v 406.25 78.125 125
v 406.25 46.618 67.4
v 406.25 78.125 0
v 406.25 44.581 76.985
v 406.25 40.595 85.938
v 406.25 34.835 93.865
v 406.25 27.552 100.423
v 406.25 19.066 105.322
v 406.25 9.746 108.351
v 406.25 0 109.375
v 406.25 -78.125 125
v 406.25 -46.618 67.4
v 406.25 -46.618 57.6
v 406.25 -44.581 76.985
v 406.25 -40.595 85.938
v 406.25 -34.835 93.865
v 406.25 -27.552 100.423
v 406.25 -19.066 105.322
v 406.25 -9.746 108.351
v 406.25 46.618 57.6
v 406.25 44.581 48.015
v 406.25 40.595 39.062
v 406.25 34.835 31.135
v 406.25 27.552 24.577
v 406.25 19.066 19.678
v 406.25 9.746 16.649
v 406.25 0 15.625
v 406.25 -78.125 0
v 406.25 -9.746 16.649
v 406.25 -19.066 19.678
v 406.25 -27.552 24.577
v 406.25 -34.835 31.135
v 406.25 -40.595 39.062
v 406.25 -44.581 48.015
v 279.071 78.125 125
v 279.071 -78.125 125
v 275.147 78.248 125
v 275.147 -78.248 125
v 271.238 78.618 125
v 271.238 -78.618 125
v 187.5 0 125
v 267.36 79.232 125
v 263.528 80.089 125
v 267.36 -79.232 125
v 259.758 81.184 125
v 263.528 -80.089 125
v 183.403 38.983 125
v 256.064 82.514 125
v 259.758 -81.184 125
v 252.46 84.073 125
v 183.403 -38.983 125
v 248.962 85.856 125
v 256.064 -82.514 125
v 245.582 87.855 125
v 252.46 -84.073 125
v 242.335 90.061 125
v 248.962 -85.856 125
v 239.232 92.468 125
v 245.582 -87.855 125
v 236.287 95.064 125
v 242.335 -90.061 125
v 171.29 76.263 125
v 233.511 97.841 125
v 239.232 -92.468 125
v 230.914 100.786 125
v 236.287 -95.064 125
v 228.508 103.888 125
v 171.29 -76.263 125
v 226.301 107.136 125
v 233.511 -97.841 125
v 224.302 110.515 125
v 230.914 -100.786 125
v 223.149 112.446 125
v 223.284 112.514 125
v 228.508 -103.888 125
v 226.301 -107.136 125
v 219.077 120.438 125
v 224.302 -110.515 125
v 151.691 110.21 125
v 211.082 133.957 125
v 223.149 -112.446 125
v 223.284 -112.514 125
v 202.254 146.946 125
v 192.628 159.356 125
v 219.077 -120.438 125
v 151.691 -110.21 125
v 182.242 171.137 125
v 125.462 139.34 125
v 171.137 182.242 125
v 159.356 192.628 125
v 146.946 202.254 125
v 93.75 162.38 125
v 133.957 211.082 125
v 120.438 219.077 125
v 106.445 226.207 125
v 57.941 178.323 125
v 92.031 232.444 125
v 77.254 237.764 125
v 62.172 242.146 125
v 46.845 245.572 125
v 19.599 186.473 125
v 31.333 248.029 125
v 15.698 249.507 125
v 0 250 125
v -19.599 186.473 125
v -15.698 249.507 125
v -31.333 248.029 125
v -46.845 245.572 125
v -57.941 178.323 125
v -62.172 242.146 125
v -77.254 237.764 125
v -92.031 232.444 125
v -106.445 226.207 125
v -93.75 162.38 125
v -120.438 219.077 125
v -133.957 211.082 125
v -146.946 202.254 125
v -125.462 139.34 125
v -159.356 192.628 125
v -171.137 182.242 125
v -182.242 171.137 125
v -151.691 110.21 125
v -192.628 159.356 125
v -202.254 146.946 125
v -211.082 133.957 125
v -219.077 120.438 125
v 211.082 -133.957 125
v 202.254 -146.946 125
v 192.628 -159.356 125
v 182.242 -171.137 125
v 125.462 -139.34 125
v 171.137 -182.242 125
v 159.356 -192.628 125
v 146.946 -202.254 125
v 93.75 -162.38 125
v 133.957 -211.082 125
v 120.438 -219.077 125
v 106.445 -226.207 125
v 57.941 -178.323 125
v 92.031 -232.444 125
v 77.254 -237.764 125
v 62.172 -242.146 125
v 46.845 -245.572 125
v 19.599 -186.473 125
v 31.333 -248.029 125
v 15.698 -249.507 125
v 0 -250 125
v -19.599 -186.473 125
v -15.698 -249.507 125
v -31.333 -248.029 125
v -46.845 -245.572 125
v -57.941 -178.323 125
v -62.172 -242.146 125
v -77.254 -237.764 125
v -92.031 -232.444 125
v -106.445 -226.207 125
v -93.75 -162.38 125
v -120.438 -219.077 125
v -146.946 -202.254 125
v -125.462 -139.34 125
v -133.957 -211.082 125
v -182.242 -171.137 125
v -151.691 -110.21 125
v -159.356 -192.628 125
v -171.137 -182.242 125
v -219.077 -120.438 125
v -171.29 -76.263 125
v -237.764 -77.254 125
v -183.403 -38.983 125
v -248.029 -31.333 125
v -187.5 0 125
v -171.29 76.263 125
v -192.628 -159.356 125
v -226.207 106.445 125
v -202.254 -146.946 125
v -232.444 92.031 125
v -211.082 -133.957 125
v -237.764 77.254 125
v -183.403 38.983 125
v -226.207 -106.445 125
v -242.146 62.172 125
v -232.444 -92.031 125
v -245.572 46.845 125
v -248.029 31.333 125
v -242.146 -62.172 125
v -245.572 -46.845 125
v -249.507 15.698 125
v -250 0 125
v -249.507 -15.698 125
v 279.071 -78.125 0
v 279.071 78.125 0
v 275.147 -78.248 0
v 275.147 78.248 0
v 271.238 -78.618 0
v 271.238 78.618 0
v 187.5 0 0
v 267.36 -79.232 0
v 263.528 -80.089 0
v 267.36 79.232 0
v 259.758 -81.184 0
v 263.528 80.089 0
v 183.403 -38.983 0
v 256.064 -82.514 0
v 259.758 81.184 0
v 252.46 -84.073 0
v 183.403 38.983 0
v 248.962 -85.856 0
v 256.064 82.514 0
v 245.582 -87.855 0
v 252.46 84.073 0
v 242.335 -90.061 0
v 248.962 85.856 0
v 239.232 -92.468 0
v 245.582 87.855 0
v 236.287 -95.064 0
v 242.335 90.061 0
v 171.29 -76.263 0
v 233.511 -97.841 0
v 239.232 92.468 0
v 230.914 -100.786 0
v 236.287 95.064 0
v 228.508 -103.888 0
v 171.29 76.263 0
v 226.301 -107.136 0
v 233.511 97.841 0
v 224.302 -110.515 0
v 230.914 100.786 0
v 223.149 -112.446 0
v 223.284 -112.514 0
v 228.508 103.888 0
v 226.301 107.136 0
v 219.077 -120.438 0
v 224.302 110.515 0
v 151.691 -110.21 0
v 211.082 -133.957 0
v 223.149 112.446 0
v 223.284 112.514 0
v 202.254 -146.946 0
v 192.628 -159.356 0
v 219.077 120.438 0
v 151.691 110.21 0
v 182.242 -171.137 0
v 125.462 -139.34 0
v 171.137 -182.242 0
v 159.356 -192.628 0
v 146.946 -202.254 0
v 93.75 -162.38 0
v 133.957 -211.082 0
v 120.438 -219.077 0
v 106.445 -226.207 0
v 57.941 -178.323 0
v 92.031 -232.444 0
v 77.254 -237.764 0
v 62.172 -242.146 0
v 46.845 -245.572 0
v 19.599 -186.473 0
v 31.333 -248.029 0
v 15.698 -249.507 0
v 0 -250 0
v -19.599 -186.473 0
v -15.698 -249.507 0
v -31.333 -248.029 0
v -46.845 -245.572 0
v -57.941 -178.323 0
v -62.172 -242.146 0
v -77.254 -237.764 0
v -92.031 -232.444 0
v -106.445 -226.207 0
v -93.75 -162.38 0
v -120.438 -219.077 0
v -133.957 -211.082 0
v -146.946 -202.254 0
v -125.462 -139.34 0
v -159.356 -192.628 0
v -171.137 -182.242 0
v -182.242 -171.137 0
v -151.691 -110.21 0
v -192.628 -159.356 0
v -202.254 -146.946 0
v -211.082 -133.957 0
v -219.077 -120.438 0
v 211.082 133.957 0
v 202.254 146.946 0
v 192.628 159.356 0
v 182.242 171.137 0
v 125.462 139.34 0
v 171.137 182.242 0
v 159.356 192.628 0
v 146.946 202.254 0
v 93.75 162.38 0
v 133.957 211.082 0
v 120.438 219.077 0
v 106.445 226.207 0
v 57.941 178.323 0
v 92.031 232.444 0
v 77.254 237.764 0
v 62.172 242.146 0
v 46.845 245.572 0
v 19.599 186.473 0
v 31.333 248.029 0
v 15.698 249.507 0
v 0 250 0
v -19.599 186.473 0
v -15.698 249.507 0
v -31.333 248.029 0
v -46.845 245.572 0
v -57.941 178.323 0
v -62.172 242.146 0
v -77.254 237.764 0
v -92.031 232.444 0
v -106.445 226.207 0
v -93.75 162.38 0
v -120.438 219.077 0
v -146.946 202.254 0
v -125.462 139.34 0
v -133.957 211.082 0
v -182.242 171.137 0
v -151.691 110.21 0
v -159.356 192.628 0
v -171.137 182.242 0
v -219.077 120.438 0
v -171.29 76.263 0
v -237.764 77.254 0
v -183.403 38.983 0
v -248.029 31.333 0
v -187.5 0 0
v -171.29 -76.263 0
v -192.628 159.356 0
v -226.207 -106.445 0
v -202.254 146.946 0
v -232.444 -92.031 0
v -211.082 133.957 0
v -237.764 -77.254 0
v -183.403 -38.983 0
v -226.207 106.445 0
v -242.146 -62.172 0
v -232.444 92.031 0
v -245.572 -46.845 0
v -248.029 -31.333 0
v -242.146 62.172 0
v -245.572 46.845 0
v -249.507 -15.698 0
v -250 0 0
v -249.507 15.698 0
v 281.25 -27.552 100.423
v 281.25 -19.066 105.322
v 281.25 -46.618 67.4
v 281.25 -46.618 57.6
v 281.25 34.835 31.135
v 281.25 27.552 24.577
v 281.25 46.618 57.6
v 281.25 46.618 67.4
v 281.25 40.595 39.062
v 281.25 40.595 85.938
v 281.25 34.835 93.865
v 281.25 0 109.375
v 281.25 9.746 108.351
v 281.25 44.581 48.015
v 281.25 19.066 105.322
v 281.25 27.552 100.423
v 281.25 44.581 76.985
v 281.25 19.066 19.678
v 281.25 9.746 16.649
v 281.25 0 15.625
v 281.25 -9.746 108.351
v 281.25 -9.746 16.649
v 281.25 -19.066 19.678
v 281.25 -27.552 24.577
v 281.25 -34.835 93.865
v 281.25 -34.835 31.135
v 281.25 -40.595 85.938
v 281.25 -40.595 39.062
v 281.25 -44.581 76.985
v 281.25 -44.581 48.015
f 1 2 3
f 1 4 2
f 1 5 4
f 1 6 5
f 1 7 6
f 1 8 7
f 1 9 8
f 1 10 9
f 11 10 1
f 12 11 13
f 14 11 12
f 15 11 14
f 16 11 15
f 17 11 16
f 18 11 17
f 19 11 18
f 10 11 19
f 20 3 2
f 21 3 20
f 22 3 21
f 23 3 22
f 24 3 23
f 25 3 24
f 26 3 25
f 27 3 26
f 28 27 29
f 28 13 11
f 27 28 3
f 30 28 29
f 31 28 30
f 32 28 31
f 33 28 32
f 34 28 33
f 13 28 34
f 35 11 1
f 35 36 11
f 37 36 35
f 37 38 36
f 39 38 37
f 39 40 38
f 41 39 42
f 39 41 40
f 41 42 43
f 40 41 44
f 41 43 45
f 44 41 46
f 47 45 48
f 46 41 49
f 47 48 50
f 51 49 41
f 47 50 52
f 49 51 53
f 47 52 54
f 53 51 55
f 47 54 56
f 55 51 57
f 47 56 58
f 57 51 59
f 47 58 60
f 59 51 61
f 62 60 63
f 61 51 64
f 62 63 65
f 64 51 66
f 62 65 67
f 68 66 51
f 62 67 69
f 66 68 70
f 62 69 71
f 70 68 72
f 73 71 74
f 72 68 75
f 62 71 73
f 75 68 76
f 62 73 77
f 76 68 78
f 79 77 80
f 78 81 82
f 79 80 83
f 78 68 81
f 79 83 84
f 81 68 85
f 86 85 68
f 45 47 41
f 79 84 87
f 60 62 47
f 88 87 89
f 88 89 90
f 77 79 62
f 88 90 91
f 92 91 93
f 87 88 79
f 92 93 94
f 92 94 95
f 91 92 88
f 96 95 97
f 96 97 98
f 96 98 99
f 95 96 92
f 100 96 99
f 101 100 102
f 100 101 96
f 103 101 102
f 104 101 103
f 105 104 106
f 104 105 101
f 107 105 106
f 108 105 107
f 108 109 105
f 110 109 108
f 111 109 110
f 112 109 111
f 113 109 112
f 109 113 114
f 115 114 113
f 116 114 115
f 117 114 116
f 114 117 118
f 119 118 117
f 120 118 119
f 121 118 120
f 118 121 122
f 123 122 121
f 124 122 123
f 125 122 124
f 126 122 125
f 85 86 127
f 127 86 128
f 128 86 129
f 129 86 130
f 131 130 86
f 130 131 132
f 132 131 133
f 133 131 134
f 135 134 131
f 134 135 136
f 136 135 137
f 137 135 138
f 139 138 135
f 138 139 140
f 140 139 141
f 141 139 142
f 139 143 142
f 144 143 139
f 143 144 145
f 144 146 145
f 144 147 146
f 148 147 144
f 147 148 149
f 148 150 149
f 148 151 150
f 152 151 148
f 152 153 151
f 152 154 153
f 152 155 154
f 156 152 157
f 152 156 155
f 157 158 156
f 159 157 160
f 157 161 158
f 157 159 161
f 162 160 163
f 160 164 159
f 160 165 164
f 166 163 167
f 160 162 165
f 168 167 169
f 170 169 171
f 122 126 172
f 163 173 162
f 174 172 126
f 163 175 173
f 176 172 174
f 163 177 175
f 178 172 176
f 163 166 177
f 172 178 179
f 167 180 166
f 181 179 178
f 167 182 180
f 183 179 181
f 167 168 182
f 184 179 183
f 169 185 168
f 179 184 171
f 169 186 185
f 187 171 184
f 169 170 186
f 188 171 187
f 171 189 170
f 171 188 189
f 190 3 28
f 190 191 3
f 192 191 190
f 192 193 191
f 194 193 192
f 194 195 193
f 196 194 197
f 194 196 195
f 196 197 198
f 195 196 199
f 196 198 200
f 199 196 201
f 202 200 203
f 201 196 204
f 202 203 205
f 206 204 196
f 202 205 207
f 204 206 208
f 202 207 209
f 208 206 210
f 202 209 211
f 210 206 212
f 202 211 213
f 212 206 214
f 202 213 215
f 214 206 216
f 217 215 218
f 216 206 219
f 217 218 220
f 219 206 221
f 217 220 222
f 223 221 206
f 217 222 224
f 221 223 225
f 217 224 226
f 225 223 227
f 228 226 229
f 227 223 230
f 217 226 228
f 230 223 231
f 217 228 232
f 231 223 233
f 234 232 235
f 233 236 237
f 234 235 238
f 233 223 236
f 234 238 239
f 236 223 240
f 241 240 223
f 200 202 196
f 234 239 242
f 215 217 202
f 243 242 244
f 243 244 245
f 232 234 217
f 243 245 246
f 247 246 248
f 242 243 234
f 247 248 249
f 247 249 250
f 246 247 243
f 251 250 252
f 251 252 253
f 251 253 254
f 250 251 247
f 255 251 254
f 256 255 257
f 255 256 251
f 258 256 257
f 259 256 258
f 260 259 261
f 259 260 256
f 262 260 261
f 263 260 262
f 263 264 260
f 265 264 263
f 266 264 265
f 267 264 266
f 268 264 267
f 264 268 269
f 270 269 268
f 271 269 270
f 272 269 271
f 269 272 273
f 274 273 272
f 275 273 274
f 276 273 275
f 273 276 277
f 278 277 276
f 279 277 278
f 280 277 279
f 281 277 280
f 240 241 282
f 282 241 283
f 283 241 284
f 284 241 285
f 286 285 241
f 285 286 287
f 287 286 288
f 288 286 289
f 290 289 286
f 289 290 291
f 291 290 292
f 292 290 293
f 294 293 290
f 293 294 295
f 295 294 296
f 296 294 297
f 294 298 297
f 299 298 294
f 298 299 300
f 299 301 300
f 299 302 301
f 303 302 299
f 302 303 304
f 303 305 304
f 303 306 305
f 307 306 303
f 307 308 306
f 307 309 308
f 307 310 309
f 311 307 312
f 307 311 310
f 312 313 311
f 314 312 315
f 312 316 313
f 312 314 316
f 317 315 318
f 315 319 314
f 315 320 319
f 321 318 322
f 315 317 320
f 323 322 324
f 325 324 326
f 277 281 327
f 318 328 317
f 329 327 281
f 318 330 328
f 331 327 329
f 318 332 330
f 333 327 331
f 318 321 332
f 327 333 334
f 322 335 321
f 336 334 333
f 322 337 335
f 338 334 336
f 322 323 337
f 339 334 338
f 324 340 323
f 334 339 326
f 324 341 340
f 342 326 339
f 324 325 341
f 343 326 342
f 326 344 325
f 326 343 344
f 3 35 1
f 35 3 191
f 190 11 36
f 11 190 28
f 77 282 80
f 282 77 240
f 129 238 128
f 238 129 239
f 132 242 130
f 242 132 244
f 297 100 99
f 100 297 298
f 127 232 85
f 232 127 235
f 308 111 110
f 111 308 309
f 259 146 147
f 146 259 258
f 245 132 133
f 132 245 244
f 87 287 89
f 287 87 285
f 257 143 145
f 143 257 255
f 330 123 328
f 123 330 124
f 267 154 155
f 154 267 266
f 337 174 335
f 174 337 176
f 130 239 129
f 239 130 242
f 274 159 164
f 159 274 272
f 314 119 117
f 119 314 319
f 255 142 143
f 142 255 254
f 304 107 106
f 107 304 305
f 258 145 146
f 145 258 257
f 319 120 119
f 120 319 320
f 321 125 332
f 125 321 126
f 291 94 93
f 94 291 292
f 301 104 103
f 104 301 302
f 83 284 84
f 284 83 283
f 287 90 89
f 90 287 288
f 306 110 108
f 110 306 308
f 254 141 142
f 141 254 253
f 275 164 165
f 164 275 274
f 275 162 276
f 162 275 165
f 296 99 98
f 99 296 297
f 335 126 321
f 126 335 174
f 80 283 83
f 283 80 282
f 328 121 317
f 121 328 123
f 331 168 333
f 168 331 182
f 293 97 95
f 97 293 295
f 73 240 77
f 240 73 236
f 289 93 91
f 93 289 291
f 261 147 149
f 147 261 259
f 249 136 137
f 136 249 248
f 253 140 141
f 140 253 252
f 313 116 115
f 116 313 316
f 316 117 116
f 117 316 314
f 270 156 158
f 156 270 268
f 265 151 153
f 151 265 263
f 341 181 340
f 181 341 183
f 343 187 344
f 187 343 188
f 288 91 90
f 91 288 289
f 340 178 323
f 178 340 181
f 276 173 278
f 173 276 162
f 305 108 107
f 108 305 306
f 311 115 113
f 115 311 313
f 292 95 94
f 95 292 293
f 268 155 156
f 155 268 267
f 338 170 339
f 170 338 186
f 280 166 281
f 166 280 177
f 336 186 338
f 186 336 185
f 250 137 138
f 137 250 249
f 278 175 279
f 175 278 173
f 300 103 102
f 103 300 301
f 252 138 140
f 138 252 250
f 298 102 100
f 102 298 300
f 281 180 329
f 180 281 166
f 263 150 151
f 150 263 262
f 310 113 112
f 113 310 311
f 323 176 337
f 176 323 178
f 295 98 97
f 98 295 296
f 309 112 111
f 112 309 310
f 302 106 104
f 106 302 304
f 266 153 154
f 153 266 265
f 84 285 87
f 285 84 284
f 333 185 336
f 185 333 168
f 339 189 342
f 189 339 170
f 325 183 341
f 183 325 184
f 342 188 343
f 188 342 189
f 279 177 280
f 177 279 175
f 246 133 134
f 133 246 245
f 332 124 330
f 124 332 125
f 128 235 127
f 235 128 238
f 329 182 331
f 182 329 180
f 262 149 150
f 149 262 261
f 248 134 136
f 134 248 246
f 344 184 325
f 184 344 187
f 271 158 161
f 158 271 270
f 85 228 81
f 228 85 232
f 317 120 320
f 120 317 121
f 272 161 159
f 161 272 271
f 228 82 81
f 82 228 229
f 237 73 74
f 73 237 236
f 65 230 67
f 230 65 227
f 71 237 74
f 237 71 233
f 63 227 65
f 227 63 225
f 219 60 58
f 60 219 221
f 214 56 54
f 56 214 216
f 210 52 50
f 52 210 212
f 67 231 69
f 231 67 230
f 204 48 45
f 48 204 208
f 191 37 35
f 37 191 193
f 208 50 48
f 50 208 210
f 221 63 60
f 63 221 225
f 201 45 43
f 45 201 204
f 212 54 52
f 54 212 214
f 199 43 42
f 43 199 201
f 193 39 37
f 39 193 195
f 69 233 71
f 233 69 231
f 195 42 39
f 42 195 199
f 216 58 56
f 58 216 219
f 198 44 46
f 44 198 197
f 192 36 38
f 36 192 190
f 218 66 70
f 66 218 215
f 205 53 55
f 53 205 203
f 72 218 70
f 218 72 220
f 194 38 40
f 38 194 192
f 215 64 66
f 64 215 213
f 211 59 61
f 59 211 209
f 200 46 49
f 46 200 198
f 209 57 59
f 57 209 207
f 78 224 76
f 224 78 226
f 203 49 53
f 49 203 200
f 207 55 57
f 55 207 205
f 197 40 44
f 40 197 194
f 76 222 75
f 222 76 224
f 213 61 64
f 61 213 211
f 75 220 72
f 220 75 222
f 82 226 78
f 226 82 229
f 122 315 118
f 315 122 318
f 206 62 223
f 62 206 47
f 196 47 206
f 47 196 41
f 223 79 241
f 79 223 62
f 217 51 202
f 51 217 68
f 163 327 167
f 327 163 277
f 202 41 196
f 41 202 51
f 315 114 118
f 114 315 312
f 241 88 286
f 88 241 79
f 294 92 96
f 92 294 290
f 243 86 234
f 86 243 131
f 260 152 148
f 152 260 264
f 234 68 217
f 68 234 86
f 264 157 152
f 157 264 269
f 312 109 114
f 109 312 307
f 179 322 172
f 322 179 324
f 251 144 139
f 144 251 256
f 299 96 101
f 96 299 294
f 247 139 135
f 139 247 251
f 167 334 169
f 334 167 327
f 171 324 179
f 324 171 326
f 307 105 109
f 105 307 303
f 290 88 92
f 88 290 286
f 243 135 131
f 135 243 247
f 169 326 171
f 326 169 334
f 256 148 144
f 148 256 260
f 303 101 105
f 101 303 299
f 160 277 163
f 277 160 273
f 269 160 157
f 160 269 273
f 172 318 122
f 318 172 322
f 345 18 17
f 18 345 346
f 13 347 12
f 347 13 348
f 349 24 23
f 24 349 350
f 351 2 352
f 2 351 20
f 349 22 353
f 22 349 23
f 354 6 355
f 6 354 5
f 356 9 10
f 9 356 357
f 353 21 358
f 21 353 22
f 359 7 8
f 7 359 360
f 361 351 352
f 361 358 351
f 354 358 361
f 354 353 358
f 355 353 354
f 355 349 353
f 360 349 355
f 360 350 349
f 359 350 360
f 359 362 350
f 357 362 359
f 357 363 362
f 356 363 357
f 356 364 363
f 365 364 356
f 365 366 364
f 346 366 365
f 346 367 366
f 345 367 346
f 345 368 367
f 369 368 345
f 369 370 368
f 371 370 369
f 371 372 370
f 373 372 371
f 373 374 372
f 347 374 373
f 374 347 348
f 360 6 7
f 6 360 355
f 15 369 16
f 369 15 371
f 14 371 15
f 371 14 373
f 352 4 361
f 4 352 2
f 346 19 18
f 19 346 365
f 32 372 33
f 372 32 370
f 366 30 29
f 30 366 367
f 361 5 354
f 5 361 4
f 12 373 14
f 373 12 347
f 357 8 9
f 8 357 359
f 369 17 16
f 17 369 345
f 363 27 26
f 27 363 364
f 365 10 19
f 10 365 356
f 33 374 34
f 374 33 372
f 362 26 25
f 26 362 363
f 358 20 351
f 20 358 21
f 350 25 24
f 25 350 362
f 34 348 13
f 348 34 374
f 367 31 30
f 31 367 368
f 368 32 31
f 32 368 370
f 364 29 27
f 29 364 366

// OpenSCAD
pad=.1; // to preserve manifold

// for all
height = 125;
echo(str("DATUM FACE-1 0 0 0"));
echo(str("DATUM FACE-2 0 0 ", height));

// ring
outerradius = 250;
innerradius = 375/2.0;
echo(str("DATUM CENTER 0 0 0"));
echo(str("DATUM INNER-RAD ", innerradius, " 0 0"));
echo(str("DATUM OUTER-RAD 0 ", outerradius, " 0"));

// stub
width = 5/32 * 1000;
length = 13/32 * 1000;

// hole for strap arm
armradius = 3/64 * 1000;
armdepth = 125;

// corner radii
toolradius = 1/16 * 1000;
cuthypotenuse = outerradius + toolradius;
cutyleg = toolradius+width/2.0;
cutxleg = sqrt(pow(cuthypotenuse,2) - pow(cutyleg,2));

difference() {
    union() {
		// stub
	    translate (v=[0, -width/2.0, 0]) cube([length, width, height]);
        // outer ring
        cylinder(r=outerradius, h=height, $fn=100);
        // add material to cut radius out of...
    	linear_extrude(height=height) polygon(points=[[cutxleg, cutyleg], [0,0], [cutxleg,-cutyleg]]);
    }

    // eccentric hole
  	translate (v=[0,0,-pad]) cylinder(r=innerradius, h=height+2*pad);

    // ...and cut radius
	union() {
        translate (v=[cutxleg, cutyleg, -1]) cylinder(r=toolradius, h=height+2, $fn=100);
        translate (v=[cutxleg, -cutyleg, -1]) cylinder(r=toolradius, h=height+2, $fn=100);
    }
	
    translate([length+pad,0,height/2]) rotate([0,-90,0]) cylinder(r=armradius, armdepth+pad);	
}    
